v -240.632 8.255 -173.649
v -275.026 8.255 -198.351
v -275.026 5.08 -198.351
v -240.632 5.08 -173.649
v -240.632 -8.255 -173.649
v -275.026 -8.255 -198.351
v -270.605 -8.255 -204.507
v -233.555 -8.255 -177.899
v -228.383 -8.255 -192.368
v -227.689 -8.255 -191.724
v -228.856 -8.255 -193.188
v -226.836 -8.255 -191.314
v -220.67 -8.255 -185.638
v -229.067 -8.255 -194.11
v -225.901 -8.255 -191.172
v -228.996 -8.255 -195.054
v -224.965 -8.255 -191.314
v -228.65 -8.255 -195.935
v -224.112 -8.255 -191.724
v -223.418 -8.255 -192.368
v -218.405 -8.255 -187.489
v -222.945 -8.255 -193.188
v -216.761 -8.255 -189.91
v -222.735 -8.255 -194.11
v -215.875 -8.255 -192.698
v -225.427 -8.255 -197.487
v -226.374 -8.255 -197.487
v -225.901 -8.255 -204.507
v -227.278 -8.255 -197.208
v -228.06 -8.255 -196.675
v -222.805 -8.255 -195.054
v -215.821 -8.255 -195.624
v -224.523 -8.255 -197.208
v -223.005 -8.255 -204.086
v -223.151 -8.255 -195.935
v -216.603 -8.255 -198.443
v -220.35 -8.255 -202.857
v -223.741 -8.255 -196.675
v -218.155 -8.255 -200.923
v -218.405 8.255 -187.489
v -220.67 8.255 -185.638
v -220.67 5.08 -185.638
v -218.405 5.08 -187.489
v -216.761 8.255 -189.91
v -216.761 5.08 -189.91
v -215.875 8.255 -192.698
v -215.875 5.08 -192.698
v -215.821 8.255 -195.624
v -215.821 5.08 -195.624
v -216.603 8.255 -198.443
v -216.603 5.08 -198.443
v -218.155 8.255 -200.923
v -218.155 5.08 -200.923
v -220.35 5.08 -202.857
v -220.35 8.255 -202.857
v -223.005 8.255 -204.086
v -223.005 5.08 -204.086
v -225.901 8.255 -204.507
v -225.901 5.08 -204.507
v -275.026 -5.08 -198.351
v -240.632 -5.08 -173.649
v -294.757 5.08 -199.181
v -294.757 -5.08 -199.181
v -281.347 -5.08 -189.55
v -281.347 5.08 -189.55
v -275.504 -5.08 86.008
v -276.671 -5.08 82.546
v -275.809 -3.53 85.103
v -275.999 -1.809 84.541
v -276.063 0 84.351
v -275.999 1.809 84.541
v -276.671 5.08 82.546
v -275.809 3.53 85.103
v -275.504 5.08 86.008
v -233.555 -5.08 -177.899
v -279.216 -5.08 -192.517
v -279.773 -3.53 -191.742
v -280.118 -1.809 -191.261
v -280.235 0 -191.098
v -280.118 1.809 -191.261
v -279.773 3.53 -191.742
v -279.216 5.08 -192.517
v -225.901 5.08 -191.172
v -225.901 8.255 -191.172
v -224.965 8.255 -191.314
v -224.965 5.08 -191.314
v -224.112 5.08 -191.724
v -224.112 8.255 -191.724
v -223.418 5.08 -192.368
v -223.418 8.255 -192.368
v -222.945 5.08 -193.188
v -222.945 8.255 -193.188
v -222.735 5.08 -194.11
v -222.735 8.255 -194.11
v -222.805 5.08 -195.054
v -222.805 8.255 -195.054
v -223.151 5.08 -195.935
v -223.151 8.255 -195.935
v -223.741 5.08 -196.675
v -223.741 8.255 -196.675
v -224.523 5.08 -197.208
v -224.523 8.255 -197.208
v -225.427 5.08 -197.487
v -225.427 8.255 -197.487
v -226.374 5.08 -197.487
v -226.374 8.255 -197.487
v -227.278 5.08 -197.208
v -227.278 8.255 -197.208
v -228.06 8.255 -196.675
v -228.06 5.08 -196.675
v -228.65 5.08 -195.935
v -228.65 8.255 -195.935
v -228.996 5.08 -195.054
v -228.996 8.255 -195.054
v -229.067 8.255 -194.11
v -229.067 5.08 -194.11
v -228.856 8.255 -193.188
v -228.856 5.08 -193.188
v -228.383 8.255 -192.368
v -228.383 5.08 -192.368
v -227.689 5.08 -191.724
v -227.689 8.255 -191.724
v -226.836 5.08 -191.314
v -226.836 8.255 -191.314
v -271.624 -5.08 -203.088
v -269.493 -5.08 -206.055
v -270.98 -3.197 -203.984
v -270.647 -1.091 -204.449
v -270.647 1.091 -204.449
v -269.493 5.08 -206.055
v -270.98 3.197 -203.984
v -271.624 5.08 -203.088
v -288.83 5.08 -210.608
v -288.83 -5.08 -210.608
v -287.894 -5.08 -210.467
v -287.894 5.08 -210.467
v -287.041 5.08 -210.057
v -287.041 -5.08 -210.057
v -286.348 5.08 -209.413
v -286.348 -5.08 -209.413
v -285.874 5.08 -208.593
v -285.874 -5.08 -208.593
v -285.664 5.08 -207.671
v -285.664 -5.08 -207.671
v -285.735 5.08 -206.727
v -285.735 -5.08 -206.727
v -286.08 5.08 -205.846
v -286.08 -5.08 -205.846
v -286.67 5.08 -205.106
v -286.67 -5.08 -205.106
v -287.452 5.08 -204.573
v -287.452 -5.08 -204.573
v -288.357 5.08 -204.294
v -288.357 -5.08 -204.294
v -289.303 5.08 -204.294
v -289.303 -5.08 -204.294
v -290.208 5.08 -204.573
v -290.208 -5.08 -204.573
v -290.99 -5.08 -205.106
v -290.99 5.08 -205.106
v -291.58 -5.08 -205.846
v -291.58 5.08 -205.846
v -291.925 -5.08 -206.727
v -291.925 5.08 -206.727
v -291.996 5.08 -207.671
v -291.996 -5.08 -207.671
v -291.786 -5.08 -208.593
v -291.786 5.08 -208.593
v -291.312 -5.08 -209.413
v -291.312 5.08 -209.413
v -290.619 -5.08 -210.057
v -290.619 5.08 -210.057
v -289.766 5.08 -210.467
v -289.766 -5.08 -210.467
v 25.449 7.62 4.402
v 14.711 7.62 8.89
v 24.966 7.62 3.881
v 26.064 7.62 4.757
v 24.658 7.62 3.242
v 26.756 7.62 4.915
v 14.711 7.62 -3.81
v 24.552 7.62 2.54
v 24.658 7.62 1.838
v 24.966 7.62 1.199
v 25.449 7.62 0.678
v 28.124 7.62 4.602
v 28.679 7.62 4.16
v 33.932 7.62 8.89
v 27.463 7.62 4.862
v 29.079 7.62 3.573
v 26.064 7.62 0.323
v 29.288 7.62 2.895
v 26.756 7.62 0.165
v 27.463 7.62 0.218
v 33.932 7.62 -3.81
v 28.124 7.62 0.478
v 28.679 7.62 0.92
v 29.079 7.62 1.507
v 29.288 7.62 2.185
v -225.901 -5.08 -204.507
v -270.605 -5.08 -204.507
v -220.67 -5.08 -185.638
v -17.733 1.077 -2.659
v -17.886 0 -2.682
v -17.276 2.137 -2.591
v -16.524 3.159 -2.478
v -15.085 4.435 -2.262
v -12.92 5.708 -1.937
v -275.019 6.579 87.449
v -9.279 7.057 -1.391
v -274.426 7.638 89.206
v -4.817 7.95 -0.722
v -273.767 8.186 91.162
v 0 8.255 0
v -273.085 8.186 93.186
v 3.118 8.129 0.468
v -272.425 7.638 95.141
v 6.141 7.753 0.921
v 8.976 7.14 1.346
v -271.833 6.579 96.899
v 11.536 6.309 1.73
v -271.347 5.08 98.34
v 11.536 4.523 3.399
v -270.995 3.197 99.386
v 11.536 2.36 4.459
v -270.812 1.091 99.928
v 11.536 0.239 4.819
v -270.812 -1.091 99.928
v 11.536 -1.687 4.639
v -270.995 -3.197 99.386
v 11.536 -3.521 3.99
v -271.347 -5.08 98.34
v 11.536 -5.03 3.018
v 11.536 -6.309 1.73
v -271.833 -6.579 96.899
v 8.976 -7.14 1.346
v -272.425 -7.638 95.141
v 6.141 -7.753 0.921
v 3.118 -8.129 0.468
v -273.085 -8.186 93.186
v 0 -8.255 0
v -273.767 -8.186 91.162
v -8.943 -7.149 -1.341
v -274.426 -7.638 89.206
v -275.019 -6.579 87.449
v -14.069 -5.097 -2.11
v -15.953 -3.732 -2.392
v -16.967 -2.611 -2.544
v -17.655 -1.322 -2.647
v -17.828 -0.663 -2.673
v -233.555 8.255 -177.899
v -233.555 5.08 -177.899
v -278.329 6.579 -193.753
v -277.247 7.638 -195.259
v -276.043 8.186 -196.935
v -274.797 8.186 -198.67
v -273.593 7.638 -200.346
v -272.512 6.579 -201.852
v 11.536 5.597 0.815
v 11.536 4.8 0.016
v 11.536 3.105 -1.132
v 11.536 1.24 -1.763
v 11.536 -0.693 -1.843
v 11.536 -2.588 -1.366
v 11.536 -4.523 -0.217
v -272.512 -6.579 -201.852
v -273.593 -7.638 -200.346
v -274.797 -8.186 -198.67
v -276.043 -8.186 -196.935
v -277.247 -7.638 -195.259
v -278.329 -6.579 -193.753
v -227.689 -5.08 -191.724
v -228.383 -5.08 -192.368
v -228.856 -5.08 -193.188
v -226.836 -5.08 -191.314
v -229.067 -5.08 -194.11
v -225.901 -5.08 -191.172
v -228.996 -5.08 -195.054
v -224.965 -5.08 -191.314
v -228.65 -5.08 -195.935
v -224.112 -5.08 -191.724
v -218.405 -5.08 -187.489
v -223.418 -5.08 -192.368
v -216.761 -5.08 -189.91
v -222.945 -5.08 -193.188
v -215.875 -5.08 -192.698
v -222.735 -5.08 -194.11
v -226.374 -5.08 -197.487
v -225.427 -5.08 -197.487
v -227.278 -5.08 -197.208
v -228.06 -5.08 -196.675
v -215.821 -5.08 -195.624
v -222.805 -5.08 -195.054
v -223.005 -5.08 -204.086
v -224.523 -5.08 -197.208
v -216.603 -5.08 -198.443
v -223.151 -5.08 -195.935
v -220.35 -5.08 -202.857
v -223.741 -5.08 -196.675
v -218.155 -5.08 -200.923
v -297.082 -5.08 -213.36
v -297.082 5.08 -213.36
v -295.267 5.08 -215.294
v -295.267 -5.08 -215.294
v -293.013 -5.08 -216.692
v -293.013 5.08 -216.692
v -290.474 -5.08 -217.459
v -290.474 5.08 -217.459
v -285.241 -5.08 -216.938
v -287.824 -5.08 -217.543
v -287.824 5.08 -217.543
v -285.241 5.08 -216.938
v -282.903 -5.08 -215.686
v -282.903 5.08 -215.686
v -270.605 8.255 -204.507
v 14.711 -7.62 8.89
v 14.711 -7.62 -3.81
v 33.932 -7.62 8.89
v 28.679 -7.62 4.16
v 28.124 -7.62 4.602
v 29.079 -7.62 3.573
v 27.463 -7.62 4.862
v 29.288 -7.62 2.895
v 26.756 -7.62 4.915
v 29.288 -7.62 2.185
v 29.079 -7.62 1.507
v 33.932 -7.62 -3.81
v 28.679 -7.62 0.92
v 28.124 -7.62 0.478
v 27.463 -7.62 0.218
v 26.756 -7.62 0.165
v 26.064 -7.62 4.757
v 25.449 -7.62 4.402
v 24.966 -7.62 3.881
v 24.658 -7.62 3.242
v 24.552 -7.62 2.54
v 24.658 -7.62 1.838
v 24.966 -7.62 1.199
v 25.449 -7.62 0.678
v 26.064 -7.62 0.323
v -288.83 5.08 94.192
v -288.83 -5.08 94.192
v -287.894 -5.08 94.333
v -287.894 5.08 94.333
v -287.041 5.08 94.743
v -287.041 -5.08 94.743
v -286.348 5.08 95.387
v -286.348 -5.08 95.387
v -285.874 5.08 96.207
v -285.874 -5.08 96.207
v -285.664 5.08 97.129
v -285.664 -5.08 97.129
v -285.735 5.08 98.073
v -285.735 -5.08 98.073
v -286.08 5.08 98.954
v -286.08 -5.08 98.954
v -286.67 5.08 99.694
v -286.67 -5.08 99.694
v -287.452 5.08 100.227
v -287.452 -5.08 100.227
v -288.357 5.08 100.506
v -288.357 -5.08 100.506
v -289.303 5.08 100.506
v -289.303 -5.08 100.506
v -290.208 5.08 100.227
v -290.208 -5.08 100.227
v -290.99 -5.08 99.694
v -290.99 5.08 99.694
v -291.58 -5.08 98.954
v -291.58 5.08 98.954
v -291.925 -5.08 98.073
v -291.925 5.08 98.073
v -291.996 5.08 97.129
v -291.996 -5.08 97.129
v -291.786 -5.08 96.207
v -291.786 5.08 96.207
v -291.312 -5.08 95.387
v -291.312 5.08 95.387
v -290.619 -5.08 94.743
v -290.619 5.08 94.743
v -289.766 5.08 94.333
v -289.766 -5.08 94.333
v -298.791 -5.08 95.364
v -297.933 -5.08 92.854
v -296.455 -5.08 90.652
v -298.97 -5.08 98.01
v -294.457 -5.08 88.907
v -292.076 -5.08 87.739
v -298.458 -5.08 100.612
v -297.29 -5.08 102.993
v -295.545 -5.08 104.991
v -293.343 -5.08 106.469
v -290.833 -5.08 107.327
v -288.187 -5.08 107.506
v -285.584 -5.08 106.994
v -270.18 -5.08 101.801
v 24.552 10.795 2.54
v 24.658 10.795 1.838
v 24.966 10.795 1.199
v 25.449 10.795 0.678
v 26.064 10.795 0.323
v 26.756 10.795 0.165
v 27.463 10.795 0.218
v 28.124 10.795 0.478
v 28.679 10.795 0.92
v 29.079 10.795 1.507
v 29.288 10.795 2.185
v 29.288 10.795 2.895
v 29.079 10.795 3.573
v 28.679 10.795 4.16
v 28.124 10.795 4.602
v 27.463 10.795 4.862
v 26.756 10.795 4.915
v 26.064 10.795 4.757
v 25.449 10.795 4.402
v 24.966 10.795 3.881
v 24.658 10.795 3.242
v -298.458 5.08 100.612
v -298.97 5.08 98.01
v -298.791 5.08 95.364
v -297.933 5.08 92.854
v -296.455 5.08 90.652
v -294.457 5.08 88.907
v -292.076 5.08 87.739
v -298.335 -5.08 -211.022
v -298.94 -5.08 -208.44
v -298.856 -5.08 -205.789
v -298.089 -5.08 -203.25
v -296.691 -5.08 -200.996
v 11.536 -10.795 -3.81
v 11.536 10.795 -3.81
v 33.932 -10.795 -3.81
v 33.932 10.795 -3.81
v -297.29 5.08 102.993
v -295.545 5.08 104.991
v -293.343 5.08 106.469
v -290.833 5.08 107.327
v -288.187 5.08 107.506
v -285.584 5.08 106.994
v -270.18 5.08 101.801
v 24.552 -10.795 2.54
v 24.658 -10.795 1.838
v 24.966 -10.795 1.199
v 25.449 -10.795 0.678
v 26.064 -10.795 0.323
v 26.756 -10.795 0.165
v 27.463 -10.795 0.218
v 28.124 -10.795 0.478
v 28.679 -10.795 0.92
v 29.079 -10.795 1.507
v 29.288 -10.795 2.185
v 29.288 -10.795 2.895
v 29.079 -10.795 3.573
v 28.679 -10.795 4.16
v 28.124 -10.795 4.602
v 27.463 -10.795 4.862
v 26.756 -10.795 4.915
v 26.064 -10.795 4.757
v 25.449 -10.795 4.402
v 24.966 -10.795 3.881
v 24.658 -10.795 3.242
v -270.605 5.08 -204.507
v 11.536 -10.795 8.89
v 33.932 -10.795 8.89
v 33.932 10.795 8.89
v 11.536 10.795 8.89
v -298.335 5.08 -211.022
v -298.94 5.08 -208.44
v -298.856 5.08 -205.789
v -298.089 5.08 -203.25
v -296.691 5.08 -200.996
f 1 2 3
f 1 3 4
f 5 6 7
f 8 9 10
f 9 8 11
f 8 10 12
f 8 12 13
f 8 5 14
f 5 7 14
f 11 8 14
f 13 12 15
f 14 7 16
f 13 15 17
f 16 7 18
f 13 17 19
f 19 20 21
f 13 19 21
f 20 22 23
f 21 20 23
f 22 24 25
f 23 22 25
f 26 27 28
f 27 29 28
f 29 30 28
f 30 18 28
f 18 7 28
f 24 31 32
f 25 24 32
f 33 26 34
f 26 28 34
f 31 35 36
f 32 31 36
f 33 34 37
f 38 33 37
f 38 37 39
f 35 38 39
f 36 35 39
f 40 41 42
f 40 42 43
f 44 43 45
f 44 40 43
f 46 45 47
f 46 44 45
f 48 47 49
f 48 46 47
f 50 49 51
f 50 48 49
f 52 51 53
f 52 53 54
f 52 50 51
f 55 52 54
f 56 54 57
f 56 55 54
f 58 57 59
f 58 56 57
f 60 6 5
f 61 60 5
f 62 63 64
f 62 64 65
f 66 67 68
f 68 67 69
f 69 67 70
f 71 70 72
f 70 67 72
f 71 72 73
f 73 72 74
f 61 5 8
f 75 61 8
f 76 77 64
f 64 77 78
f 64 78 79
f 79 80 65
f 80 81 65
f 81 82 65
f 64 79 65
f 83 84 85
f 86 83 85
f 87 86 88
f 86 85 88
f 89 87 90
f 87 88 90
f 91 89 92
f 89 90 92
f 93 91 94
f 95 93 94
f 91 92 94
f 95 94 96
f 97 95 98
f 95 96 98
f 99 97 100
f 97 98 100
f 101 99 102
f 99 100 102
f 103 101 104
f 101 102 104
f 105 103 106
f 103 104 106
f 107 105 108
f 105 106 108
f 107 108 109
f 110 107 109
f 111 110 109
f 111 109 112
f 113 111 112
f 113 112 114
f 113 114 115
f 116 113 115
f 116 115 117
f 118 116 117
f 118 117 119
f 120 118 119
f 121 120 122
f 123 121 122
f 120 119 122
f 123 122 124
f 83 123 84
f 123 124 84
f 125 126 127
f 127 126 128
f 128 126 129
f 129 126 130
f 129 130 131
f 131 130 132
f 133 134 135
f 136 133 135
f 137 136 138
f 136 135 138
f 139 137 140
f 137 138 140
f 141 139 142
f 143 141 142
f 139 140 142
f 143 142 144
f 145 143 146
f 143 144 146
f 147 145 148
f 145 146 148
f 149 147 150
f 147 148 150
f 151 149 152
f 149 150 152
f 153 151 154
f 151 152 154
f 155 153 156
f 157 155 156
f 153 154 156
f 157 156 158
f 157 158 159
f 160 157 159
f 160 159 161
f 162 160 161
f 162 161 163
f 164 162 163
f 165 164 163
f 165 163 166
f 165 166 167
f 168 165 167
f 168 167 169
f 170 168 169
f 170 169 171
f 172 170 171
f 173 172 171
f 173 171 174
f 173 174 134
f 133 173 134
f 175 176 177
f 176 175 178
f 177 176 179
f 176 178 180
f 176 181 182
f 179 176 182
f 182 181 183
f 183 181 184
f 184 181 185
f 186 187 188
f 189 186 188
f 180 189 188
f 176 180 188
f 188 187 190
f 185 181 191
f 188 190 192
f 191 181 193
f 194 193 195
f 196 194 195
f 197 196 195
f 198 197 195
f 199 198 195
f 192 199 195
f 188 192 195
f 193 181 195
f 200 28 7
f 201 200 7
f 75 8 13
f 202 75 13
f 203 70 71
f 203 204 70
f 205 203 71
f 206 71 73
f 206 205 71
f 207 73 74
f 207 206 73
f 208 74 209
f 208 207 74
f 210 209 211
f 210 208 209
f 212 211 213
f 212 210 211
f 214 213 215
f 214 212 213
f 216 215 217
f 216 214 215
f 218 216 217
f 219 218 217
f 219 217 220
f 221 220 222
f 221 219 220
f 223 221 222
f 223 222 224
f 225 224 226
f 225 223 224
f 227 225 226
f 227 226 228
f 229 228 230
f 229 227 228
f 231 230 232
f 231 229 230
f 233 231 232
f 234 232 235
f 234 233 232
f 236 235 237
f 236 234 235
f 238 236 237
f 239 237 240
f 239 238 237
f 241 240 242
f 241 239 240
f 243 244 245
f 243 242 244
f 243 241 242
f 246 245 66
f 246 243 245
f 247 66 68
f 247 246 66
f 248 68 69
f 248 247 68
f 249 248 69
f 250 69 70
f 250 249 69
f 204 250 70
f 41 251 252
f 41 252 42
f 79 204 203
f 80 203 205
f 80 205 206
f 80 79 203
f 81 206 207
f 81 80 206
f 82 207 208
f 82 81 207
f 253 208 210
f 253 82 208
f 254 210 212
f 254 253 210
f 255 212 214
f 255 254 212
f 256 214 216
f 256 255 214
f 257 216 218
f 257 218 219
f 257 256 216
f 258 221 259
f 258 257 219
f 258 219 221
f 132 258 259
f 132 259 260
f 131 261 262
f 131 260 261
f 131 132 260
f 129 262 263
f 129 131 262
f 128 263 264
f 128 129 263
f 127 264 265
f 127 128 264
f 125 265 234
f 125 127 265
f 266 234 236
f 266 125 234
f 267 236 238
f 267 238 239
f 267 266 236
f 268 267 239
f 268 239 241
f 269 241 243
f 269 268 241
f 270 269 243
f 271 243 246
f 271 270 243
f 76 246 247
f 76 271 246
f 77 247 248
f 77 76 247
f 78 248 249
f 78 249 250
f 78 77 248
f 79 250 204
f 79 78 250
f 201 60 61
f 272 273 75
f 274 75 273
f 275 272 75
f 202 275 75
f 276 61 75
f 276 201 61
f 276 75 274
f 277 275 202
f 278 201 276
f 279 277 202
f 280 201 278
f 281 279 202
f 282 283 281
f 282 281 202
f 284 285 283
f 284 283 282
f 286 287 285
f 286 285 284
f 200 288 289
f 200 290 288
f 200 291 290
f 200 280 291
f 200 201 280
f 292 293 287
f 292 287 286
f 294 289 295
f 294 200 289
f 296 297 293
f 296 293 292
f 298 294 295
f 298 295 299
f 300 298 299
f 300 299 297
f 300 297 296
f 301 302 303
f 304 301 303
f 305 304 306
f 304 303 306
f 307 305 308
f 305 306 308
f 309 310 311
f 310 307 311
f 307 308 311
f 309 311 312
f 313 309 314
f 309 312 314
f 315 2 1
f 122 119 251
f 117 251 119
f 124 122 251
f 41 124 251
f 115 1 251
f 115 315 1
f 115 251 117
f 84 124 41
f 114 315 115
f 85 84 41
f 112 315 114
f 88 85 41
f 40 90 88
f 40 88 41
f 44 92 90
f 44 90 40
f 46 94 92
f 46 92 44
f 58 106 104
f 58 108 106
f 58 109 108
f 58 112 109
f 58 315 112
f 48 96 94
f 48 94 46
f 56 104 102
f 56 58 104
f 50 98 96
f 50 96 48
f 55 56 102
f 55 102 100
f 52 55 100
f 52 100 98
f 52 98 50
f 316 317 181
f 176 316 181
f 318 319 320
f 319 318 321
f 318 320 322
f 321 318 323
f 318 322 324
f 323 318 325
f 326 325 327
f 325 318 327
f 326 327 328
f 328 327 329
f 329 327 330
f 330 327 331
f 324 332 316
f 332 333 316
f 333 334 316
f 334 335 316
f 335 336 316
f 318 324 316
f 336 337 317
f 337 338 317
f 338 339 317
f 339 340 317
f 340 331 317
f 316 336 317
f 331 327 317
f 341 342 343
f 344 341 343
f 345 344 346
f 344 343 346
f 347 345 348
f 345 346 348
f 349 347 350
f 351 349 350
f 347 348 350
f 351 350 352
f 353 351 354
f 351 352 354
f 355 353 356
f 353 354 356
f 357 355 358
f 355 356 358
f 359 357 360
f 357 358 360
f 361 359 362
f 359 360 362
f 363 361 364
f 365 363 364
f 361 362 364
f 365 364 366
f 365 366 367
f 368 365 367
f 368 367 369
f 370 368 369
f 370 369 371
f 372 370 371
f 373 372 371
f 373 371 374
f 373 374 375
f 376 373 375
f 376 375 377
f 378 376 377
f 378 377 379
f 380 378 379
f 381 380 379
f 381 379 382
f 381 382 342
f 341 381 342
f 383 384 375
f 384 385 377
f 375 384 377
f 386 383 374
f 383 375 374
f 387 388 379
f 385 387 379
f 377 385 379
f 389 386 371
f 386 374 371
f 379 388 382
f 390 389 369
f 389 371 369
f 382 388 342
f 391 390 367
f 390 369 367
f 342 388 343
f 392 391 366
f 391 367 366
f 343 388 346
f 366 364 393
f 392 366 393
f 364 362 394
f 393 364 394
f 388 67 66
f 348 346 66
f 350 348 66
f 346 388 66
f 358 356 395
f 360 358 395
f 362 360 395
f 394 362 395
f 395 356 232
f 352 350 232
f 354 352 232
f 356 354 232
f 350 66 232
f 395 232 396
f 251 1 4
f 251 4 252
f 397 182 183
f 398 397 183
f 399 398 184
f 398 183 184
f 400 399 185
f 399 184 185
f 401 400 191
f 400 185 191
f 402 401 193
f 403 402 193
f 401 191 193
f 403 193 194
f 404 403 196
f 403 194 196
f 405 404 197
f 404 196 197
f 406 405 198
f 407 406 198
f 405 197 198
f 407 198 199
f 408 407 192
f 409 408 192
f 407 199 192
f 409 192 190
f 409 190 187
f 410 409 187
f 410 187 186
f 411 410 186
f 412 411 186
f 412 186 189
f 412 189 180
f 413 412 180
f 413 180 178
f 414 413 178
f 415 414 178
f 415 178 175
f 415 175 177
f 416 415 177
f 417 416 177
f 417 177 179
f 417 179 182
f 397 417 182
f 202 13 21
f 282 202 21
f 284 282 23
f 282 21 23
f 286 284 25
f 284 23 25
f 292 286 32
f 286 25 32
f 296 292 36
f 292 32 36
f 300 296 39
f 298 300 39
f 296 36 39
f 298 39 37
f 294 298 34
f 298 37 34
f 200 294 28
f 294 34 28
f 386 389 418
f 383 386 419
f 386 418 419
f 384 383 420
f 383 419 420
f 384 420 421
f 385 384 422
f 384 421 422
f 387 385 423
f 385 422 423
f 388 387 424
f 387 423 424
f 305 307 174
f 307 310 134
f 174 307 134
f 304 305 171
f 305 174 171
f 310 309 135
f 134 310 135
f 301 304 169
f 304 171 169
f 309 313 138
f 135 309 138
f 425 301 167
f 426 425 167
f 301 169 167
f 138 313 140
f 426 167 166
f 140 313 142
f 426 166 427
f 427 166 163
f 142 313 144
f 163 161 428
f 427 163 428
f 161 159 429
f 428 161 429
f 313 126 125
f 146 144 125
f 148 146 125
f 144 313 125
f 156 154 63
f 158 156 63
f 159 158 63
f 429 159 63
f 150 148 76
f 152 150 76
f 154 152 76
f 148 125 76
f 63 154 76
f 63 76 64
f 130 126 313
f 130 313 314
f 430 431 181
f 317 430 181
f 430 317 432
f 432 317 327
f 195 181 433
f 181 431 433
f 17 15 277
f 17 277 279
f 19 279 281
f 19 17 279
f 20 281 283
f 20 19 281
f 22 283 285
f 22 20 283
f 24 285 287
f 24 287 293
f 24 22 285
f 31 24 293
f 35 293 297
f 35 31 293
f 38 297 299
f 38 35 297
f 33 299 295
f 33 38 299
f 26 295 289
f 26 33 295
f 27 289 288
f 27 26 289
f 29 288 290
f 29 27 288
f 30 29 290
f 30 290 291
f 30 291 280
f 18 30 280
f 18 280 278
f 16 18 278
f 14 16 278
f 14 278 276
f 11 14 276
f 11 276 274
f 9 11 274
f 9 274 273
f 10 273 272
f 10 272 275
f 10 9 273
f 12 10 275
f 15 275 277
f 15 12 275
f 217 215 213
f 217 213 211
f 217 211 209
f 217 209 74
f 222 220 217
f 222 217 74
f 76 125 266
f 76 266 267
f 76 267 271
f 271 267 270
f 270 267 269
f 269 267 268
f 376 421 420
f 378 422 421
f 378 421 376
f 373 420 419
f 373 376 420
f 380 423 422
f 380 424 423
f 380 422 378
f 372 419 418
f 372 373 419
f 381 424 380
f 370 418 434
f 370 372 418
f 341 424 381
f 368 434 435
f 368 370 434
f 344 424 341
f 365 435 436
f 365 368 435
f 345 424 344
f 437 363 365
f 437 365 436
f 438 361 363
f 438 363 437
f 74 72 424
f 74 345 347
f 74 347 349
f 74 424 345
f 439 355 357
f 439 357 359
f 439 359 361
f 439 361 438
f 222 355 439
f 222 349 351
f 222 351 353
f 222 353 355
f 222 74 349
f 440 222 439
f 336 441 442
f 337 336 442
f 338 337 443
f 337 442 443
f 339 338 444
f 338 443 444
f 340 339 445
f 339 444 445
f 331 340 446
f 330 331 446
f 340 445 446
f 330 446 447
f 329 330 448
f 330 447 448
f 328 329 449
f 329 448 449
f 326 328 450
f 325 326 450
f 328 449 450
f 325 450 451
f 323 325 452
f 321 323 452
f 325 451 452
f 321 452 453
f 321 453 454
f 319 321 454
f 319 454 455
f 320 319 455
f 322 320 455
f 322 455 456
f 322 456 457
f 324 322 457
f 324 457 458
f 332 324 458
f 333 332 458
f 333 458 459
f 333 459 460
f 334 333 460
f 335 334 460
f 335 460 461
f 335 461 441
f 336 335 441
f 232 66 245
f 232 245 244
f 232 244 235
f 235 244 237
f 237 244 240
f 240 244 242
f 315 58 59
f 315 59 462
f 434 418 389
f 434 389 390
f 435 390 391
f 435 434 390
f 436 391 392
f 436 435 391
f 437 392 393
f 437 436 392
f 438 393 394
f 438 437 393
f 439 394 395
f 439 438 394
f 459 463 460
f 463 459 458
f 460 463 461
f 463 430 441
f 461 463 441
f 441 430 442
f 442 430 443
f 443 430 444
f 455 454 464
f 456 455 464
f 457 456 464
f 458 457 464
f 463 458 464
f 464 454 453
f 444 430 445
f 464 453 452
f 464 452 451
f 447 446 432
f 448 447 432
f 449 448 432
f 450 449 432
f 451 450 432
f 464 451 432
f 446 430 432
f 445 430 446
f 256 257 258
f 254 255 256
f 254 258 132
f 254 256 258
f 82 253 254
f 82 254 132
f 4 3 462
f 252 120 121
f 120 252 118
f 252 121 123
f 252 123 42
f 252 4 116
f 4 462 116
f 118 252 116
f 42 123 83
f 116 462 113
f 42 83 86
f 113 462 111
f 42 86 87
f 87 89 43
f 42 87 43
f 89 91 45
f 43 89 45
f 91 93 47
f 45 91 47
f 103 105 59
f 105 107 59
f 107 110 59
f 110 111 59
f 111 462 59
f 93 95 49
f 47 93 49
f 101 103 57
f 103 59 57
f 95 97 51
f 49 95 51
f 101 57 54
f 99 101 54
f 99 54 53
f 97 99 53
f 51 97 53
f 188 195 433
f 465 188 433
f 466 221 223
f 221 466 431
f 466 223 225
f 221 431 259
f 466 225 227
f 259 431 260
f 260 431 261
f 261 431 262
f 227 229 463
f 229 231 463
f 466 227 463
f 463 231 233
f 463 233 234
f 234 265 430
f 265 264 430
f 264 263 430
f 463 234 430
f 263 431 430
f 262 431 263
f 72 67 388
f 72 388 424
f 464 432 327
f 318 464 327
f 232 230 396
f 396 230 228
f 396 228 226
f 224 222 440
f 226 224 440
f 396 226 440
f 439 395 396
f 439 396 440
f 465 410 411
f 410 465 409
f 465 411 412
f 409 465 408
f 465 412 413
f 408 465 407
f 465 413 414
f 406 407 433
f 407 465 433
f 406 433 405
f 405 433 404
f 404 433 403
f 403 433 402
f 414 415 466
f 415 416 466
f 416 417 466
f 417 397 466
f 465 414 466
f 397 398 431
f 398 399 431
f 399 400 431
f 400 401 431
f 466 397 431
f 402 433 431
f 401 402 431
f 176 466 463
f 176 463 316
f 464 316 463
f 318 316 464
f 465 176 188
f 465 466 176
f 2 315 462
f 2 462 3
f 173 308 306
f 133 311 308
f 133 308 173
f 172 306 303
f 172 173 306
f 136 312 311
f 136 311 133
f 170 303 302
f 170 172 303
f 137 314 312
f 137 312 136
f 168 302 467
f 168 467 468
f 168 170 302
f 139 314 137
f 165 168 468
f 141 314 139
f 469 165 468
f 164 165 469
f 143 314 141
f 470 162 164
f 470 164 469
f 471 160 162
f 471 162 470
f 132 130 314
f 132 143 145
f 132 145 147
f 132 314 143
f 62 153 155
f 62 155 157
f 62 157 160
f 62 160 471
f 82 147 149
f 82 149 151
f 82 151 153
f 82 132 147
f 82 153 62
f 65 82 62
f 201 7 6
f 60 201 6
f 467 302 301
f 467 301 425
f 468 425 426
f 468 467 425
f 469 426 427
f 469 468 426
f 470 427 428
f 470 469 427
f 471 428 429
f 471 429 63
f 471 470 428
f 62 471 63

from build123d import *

# Parameters (mm, degrees)
SKETCH2_R                      = 8.255
BOSS_EXTRUDE1_DEPTH            = 8.89
BOSS_EXTRUDE1_DEPTH_BACK       = 3.81
BOSS_EXTRUDE2_DEPTH            = 10.16
BOSS_EXTRUDE2_DEPTH_BACK       = 16.256
SKETCH4_W                      = 20.32
SKETCH4_H                      = 10.16
BOSS_EXTRUDE3_DEPTH            = 10.16
BOSS_EXTRUDE3_DEPTH_BACK       = 16.51
SKETCH5_W                      = 20.32
SKETCH5_H                      = 10.16
CUT_EXTRUDE1_DEPTH             = 376.737208279
CUT_EXTRUDE2_DEPTH             = 373.322054439
CUT_EXTRUDE3_START             = -16.256
CUT_EXTRUDE3_DEPTH             = 16.256
CUT_EXTRUDE4_DEPTH             = 16.51
E_0_25_DIAMETER_HOLE1_D        = 6.35
E_0_25_DIAMETER_HOLE1_DEPTH    = 19.05
E_0_25_DIAMETER_HOLE1_TIP      = 1.907732465
F_3_16_0_1875_DIAMETER_HOLE1_D = 4.7625
CUT_EXTRUDE5_DEPTH             = 376.241596631
BOSS_EXTRUDE4_START            = 8.255
SKETCH15_R                     = 3.175
BOSS_EXTRUDE4_DEPTH            = 3.175
BOSS_EXTRUDE6_START            = -8.255
SKETCH16_R                     = 3.175
BOSS_EXTRUDE6_DEPTH            = 3.175


with BuildPart() as part:
    # Sweep1: sweep along a path in Sketch1
    with BuildLine(Plane(origin=(0, 0, 0), x_dir=(1, 0, 0), z_dir=(0, 1, 0))) as sweep1_path:
        Line((-288.830005751, -97.366666667), (0, 0))
        Line((0, 0), (-288.830005751, 207.433333333))
    # Sketch2 → Sweep1 (sweep)
    with BuildSketch(Plane(origin=(-288.830005751, 0, 97.366666667), x_dir=(-0.319444444444445, 0, -0.9476050057453159), z_dir=(0.9476050057453159, 0, -0.319444444444445))):
        Circle(SKETCH2_R)
    sweep(path=sweep1_path.line, transition=Transition.RIGHT)

    # Sketch3 → Boss-Extrude1 (add, two sides: drawn at the far end of the back side and taken through both)
    with BuildSketch(Plane.XY.offset(-BOSS_EXTRUDE1_DEPTH_BACK)):
        Polygon((33.931753368, 10.795), (11.535833333, 10.795), (11.535833333, -10.795), (33.931753368, -10.795), (33.931753368, -7.62), (14.710833333, -7.62), (14.710833333, 7.62), (33.931753368, 7.62), align=None)
    extrude(amount=BOSS_EXTRUDE1_DEPTH + BOSS_EXTRUDE1_DEPTH_BACK)

    # Sketch4 → Boss-Extrude2 (add, two sides: drawn at the far end of the back side and taken through both)
    with BuildSketch(Plane(origin=(-288.830005751, 0, 97.366666667), x_dir=(0.319444444444445, 0, 0.9476050057453159), z_dir=(-0.9476050057453159, 0, 0.319444444444445)).offset(-BOSS_EXTRUDE2_DEPTH_BACK)):
        Rectangle(SKETCH4_W, SKETCH4_H)
    extrude(amount=BOSS_EXTRUDE2_DEPTH + BOSS_EXTRUDE2_DEPTH_BACK)

    # Sketch5 → Boss-Extrude3 (add, two sides: drawn at the far end of the back side and taken through both)
    with BuildSketch(Plane(origin=(-288.830005751, 0, -207.433333333), x_dir=(-0.5833333333333331, 0, 0.8122328620674139), z_dir=(-0.8122328620674139, 0, -0.5833333333333331)).offset(-BOSS_EXTRUDE3_DEPTH_BACK)):
        Rectangle(SKETCH5_W, SKETCH5_H)
    extrude(amount=BOSS_EXTRUDE3_DEPTH + BOSS_EXTRUDE3_DEPTH_BACK)

    # Sketch6 → Cut-Extrude1 (cut, through all)
    with BuildSketch(Plane(origin=(0, 5.08, 0), x_dir=(1, 0, 0), z_dir=(0, 1, 0))):
        with BuildLine():
            Line((-294.756672418, 199.181047455), (-303.008958296, 205.107714121))
            Line((-303.008958296, 205.107714121), (-297.08229163, 213.36))
            ThreePointArc((-297.08229163, 213.36), (-298.856039246, 205.788872218), (-294.756672418, 199.181047455))
        make_face()
    cut_extrude1 = extrude(amount=-CUT_EXTRUDE1_DEPTH, mode=Mode.SUBTRACT)

    # Mirror1: Cut-Extrude1 across plane
    add(cut_extrude1.mirror(Plane(origin=(0, 0, 0), x_dir=(0.8122328620674136, 0, 0.5833333333333334), z_dir=(-0.583333333333333, 0, 0.8122328620674137))), mode=Mode.SUBTRACT)

    # Sketch7 → Cut-Extrude2 (cut, through all)
    with BuildSketch(Plane(origin=(0, 5.08, 0), x_dir=(1, 0, 0), z_dir=(0, 1, 0))):
        with BuildLine():
            Line((-285.584450196, -106.994333525), (-295.212117054, -110.239889081))
            Line((-295.212117054, -110.239889081), (-298.45767261, -100.612222222))
            ThreePointArc((-298.45767261, -100.612222222), (-293.342839932, -106.469409531), (-285.584450196, -106.994333525))
        make_face()
    cut_extrude2 = extrude(amount=-CUT_EXTRUDE2_DEPTH, mode=Mode.SUBTRACT)

    # Mirror2: Cut-Extrude2 across plane
    add(cut_extrude2.mirror(Plane(origin=(0, 0, 0), x_dir=(0.9476050057453158, 0, -0.3194444444444451), z_dir=(0.319444444444445, 0, 0.9476050057453159))), mode=Mode.SUBTRACT)

    # Sketch8 → Cut-Extrude3 (cut)
    with BuildSketch(Plane(origin=(-288.830005751, 0, 97.366666667), x_dir=(0.319444444444445, 0, 0.9476050057453159), z_dir=(-0.9476050057453159, 0, 0.319444444444445)).offset(CUT_EXTRUDE3_START)):
        with BuildLine():
            Line((6.506813736, -5.08), (-6.506813736, -5.08))
            ThreePointArc((-6.506813736, -5.08), (0, -8.255), (6.506813736, -5.08))
        make_face()
        with BuildLine():
            Line((-6.506813736, 5.08), (6.506813736, 5.08))
            ThreePointArc((6.506813736, 5.08), (0, 8.255), (-6.506813736, 5.08))
        make_face()
    extrude(amount=CUT_EXTRUDE3_DEPTH, mode=Mode.SUBTRACT)

    # Sketch9 → Cut-Extrude4 (cut)
    with BuildSketch(Plane(origin=(-288.830005751, 0, -207.433333333), x_dir=(-0.5833333333333331, 0, 0.8122328620674139), z_dir=(-0.8122328620674139, 0, -0.5833333333333331))):
        with BuildLine():
            Line((6.506813736, -5.08), (-6.506813736, -5.08))
            ThreePointArc((-6.506813736, -5.08), (0, -8.255), (6.506813736, -5.08))
        make_face()
        with BuildLine():
            Line((-6.506813736, 5.08), (6.506813736, 5.08))
            ThreePointArc((6.506813736, 5.08), (0, 8.255), (-6.506813736, 5.08))
        make_face()
    extrude(amount=-CUT_EXTRUDE4_DEPTH, mode=Mode.SUBTRACT)

    # E (0.25) Diameter Hole1
    with Locations(Plane(origin=(-288.830005751, 5.08, -207.433333333), x_dir=(0, 0, 1), z_dir=(0, 1, 0))):
        with Locations((0, 0), (304.8, 0)):
            Hole(E_0_25_DIAMETER_HOLE1_D / 2, depth=E_0_25_DIAMETER_HOLE1_DEPTH)
            with Locations((0, 0, -(E_0_25_DIAMETER_HOLE1_DEPTH + E_0_25_DIAMETER_HOLE1_TIP / 2))):  # 118° drill point
                Cone(0, E_0_25_DIAMETER_HOLE1_D / 2, E_0_25_DIAMETER_HOLE1_TIP, mode=Mode.SUBTRACT)

    # 3/16 (0.1875) Diameter Hole1 (through all)
    with Locations(Plane(origin=(0, 10.795, 0), x_dir=(1, 0, 0), z_dir=(0, 1, 0))):
        with Locations((26.933488785, -2.54)):
            Hole(F_3_16_0_1875_DIAMETER_HOLE1_D / 2)

    # Sketch14 → Cut-Extrude5 (cut, through all)
    with BuildSketch(Plane.XY.offset(8.89)):
        with BuildLine():
            Line((14.710833333, 4.695332569), (14.710833333, -4.695332569))
            add(Edge.make_bspline(
                [(14.710833333, -4.695332569), (21.746085132, 0), (14.710833333, 4.695332569)],
                knots=[5.678155611, 5.678155611, 5.678155611, 6.888215004, 6.888215004, 6.888215004], degree=2, weights=[1, 0.822485207, 1]))
        make_face()
    extrude(amount=-CUT_EXTRUDE5_DEPTH, mode=Mode.SUBTRACT)


with BuildPart() as body_2:
    # Sketch15 → Boss-Extrude4 (new body)
    with BuildSketch(Plane(origin=(0, 0, 0), x_dir=(1, 0, 0), z_dir=(0, 1, 0)).offset(BOSS_EXTRUDE4_START)):
        with BuildLine():
            Line((-225.900624532, 204.507482276), (-270.604624532, 204.507482276))
            Line((-270.604624532, 204.507482276), (-275.026418863, 198.350579421))
            Line((-275.026418863, 198.350579421), (-240.631954573, 173.648996365))
            Line((-240.631954573, 173.648996365), (-233.555101944, 177.899076585))
            Line((-233.555101944, 177.899076585), (-220.669756569, 185.637509811))
            ThreePointArc((-220.669756569, 185.637509811), (-216.109840083, 197.061545628), (-225.900624532, 204.507482276))
        make_face()
        with Locations(Location((-225.900624532, 194.347482276, 0), (0, 0, 270))):
            Circle(SKETCH15_R, mode=Mode.SUBTRACT)
    extrude(amount=-BOSS_EXTRUDE4_DEPTH)


with BuildPart() as body_3:
    # Sketch16 → Boss-Extrude6 (new body)
    with BuildSketch(Plane(origin=(0, 0, 0), x_dir=(1, 0, 0), z_dir=(0, 1, 0)).offset(BOSS_EXTRUDE6_START)):
        with BuildLine():
            Line((-270.604624532, 204.507482276), (-275.026418863, 198.350579421))
            Line((-275.026418863, 198.350579421), (-240.631954573, 173.648996365))
            Line((-240.631954573, 173.648996365), (-233.555101944, 177.899076585))
            Line((-233.555101944, 177.899076585), (-220.669756569, 185.637509811))
            ThreePointArc((-220.669756569, 185.637509811), (-216.109840083, 197.061545628), (-225.900624532, 204.507482276))
            Line((-225.900624532, 204.507482276), (-270.604624532, 204.507482276))
        make_face()
        with Locations(Location((-225.900624532, 194.347482276, 0), (0, 0, 270))):
            Circle(SKETCH16_R, mode=Mode.SUBTRACT)
    extrude(amount=BOSS_EXTRUDE6_DEPTH)


solid = Compound([part.part, body_2.part, body_3.part])
